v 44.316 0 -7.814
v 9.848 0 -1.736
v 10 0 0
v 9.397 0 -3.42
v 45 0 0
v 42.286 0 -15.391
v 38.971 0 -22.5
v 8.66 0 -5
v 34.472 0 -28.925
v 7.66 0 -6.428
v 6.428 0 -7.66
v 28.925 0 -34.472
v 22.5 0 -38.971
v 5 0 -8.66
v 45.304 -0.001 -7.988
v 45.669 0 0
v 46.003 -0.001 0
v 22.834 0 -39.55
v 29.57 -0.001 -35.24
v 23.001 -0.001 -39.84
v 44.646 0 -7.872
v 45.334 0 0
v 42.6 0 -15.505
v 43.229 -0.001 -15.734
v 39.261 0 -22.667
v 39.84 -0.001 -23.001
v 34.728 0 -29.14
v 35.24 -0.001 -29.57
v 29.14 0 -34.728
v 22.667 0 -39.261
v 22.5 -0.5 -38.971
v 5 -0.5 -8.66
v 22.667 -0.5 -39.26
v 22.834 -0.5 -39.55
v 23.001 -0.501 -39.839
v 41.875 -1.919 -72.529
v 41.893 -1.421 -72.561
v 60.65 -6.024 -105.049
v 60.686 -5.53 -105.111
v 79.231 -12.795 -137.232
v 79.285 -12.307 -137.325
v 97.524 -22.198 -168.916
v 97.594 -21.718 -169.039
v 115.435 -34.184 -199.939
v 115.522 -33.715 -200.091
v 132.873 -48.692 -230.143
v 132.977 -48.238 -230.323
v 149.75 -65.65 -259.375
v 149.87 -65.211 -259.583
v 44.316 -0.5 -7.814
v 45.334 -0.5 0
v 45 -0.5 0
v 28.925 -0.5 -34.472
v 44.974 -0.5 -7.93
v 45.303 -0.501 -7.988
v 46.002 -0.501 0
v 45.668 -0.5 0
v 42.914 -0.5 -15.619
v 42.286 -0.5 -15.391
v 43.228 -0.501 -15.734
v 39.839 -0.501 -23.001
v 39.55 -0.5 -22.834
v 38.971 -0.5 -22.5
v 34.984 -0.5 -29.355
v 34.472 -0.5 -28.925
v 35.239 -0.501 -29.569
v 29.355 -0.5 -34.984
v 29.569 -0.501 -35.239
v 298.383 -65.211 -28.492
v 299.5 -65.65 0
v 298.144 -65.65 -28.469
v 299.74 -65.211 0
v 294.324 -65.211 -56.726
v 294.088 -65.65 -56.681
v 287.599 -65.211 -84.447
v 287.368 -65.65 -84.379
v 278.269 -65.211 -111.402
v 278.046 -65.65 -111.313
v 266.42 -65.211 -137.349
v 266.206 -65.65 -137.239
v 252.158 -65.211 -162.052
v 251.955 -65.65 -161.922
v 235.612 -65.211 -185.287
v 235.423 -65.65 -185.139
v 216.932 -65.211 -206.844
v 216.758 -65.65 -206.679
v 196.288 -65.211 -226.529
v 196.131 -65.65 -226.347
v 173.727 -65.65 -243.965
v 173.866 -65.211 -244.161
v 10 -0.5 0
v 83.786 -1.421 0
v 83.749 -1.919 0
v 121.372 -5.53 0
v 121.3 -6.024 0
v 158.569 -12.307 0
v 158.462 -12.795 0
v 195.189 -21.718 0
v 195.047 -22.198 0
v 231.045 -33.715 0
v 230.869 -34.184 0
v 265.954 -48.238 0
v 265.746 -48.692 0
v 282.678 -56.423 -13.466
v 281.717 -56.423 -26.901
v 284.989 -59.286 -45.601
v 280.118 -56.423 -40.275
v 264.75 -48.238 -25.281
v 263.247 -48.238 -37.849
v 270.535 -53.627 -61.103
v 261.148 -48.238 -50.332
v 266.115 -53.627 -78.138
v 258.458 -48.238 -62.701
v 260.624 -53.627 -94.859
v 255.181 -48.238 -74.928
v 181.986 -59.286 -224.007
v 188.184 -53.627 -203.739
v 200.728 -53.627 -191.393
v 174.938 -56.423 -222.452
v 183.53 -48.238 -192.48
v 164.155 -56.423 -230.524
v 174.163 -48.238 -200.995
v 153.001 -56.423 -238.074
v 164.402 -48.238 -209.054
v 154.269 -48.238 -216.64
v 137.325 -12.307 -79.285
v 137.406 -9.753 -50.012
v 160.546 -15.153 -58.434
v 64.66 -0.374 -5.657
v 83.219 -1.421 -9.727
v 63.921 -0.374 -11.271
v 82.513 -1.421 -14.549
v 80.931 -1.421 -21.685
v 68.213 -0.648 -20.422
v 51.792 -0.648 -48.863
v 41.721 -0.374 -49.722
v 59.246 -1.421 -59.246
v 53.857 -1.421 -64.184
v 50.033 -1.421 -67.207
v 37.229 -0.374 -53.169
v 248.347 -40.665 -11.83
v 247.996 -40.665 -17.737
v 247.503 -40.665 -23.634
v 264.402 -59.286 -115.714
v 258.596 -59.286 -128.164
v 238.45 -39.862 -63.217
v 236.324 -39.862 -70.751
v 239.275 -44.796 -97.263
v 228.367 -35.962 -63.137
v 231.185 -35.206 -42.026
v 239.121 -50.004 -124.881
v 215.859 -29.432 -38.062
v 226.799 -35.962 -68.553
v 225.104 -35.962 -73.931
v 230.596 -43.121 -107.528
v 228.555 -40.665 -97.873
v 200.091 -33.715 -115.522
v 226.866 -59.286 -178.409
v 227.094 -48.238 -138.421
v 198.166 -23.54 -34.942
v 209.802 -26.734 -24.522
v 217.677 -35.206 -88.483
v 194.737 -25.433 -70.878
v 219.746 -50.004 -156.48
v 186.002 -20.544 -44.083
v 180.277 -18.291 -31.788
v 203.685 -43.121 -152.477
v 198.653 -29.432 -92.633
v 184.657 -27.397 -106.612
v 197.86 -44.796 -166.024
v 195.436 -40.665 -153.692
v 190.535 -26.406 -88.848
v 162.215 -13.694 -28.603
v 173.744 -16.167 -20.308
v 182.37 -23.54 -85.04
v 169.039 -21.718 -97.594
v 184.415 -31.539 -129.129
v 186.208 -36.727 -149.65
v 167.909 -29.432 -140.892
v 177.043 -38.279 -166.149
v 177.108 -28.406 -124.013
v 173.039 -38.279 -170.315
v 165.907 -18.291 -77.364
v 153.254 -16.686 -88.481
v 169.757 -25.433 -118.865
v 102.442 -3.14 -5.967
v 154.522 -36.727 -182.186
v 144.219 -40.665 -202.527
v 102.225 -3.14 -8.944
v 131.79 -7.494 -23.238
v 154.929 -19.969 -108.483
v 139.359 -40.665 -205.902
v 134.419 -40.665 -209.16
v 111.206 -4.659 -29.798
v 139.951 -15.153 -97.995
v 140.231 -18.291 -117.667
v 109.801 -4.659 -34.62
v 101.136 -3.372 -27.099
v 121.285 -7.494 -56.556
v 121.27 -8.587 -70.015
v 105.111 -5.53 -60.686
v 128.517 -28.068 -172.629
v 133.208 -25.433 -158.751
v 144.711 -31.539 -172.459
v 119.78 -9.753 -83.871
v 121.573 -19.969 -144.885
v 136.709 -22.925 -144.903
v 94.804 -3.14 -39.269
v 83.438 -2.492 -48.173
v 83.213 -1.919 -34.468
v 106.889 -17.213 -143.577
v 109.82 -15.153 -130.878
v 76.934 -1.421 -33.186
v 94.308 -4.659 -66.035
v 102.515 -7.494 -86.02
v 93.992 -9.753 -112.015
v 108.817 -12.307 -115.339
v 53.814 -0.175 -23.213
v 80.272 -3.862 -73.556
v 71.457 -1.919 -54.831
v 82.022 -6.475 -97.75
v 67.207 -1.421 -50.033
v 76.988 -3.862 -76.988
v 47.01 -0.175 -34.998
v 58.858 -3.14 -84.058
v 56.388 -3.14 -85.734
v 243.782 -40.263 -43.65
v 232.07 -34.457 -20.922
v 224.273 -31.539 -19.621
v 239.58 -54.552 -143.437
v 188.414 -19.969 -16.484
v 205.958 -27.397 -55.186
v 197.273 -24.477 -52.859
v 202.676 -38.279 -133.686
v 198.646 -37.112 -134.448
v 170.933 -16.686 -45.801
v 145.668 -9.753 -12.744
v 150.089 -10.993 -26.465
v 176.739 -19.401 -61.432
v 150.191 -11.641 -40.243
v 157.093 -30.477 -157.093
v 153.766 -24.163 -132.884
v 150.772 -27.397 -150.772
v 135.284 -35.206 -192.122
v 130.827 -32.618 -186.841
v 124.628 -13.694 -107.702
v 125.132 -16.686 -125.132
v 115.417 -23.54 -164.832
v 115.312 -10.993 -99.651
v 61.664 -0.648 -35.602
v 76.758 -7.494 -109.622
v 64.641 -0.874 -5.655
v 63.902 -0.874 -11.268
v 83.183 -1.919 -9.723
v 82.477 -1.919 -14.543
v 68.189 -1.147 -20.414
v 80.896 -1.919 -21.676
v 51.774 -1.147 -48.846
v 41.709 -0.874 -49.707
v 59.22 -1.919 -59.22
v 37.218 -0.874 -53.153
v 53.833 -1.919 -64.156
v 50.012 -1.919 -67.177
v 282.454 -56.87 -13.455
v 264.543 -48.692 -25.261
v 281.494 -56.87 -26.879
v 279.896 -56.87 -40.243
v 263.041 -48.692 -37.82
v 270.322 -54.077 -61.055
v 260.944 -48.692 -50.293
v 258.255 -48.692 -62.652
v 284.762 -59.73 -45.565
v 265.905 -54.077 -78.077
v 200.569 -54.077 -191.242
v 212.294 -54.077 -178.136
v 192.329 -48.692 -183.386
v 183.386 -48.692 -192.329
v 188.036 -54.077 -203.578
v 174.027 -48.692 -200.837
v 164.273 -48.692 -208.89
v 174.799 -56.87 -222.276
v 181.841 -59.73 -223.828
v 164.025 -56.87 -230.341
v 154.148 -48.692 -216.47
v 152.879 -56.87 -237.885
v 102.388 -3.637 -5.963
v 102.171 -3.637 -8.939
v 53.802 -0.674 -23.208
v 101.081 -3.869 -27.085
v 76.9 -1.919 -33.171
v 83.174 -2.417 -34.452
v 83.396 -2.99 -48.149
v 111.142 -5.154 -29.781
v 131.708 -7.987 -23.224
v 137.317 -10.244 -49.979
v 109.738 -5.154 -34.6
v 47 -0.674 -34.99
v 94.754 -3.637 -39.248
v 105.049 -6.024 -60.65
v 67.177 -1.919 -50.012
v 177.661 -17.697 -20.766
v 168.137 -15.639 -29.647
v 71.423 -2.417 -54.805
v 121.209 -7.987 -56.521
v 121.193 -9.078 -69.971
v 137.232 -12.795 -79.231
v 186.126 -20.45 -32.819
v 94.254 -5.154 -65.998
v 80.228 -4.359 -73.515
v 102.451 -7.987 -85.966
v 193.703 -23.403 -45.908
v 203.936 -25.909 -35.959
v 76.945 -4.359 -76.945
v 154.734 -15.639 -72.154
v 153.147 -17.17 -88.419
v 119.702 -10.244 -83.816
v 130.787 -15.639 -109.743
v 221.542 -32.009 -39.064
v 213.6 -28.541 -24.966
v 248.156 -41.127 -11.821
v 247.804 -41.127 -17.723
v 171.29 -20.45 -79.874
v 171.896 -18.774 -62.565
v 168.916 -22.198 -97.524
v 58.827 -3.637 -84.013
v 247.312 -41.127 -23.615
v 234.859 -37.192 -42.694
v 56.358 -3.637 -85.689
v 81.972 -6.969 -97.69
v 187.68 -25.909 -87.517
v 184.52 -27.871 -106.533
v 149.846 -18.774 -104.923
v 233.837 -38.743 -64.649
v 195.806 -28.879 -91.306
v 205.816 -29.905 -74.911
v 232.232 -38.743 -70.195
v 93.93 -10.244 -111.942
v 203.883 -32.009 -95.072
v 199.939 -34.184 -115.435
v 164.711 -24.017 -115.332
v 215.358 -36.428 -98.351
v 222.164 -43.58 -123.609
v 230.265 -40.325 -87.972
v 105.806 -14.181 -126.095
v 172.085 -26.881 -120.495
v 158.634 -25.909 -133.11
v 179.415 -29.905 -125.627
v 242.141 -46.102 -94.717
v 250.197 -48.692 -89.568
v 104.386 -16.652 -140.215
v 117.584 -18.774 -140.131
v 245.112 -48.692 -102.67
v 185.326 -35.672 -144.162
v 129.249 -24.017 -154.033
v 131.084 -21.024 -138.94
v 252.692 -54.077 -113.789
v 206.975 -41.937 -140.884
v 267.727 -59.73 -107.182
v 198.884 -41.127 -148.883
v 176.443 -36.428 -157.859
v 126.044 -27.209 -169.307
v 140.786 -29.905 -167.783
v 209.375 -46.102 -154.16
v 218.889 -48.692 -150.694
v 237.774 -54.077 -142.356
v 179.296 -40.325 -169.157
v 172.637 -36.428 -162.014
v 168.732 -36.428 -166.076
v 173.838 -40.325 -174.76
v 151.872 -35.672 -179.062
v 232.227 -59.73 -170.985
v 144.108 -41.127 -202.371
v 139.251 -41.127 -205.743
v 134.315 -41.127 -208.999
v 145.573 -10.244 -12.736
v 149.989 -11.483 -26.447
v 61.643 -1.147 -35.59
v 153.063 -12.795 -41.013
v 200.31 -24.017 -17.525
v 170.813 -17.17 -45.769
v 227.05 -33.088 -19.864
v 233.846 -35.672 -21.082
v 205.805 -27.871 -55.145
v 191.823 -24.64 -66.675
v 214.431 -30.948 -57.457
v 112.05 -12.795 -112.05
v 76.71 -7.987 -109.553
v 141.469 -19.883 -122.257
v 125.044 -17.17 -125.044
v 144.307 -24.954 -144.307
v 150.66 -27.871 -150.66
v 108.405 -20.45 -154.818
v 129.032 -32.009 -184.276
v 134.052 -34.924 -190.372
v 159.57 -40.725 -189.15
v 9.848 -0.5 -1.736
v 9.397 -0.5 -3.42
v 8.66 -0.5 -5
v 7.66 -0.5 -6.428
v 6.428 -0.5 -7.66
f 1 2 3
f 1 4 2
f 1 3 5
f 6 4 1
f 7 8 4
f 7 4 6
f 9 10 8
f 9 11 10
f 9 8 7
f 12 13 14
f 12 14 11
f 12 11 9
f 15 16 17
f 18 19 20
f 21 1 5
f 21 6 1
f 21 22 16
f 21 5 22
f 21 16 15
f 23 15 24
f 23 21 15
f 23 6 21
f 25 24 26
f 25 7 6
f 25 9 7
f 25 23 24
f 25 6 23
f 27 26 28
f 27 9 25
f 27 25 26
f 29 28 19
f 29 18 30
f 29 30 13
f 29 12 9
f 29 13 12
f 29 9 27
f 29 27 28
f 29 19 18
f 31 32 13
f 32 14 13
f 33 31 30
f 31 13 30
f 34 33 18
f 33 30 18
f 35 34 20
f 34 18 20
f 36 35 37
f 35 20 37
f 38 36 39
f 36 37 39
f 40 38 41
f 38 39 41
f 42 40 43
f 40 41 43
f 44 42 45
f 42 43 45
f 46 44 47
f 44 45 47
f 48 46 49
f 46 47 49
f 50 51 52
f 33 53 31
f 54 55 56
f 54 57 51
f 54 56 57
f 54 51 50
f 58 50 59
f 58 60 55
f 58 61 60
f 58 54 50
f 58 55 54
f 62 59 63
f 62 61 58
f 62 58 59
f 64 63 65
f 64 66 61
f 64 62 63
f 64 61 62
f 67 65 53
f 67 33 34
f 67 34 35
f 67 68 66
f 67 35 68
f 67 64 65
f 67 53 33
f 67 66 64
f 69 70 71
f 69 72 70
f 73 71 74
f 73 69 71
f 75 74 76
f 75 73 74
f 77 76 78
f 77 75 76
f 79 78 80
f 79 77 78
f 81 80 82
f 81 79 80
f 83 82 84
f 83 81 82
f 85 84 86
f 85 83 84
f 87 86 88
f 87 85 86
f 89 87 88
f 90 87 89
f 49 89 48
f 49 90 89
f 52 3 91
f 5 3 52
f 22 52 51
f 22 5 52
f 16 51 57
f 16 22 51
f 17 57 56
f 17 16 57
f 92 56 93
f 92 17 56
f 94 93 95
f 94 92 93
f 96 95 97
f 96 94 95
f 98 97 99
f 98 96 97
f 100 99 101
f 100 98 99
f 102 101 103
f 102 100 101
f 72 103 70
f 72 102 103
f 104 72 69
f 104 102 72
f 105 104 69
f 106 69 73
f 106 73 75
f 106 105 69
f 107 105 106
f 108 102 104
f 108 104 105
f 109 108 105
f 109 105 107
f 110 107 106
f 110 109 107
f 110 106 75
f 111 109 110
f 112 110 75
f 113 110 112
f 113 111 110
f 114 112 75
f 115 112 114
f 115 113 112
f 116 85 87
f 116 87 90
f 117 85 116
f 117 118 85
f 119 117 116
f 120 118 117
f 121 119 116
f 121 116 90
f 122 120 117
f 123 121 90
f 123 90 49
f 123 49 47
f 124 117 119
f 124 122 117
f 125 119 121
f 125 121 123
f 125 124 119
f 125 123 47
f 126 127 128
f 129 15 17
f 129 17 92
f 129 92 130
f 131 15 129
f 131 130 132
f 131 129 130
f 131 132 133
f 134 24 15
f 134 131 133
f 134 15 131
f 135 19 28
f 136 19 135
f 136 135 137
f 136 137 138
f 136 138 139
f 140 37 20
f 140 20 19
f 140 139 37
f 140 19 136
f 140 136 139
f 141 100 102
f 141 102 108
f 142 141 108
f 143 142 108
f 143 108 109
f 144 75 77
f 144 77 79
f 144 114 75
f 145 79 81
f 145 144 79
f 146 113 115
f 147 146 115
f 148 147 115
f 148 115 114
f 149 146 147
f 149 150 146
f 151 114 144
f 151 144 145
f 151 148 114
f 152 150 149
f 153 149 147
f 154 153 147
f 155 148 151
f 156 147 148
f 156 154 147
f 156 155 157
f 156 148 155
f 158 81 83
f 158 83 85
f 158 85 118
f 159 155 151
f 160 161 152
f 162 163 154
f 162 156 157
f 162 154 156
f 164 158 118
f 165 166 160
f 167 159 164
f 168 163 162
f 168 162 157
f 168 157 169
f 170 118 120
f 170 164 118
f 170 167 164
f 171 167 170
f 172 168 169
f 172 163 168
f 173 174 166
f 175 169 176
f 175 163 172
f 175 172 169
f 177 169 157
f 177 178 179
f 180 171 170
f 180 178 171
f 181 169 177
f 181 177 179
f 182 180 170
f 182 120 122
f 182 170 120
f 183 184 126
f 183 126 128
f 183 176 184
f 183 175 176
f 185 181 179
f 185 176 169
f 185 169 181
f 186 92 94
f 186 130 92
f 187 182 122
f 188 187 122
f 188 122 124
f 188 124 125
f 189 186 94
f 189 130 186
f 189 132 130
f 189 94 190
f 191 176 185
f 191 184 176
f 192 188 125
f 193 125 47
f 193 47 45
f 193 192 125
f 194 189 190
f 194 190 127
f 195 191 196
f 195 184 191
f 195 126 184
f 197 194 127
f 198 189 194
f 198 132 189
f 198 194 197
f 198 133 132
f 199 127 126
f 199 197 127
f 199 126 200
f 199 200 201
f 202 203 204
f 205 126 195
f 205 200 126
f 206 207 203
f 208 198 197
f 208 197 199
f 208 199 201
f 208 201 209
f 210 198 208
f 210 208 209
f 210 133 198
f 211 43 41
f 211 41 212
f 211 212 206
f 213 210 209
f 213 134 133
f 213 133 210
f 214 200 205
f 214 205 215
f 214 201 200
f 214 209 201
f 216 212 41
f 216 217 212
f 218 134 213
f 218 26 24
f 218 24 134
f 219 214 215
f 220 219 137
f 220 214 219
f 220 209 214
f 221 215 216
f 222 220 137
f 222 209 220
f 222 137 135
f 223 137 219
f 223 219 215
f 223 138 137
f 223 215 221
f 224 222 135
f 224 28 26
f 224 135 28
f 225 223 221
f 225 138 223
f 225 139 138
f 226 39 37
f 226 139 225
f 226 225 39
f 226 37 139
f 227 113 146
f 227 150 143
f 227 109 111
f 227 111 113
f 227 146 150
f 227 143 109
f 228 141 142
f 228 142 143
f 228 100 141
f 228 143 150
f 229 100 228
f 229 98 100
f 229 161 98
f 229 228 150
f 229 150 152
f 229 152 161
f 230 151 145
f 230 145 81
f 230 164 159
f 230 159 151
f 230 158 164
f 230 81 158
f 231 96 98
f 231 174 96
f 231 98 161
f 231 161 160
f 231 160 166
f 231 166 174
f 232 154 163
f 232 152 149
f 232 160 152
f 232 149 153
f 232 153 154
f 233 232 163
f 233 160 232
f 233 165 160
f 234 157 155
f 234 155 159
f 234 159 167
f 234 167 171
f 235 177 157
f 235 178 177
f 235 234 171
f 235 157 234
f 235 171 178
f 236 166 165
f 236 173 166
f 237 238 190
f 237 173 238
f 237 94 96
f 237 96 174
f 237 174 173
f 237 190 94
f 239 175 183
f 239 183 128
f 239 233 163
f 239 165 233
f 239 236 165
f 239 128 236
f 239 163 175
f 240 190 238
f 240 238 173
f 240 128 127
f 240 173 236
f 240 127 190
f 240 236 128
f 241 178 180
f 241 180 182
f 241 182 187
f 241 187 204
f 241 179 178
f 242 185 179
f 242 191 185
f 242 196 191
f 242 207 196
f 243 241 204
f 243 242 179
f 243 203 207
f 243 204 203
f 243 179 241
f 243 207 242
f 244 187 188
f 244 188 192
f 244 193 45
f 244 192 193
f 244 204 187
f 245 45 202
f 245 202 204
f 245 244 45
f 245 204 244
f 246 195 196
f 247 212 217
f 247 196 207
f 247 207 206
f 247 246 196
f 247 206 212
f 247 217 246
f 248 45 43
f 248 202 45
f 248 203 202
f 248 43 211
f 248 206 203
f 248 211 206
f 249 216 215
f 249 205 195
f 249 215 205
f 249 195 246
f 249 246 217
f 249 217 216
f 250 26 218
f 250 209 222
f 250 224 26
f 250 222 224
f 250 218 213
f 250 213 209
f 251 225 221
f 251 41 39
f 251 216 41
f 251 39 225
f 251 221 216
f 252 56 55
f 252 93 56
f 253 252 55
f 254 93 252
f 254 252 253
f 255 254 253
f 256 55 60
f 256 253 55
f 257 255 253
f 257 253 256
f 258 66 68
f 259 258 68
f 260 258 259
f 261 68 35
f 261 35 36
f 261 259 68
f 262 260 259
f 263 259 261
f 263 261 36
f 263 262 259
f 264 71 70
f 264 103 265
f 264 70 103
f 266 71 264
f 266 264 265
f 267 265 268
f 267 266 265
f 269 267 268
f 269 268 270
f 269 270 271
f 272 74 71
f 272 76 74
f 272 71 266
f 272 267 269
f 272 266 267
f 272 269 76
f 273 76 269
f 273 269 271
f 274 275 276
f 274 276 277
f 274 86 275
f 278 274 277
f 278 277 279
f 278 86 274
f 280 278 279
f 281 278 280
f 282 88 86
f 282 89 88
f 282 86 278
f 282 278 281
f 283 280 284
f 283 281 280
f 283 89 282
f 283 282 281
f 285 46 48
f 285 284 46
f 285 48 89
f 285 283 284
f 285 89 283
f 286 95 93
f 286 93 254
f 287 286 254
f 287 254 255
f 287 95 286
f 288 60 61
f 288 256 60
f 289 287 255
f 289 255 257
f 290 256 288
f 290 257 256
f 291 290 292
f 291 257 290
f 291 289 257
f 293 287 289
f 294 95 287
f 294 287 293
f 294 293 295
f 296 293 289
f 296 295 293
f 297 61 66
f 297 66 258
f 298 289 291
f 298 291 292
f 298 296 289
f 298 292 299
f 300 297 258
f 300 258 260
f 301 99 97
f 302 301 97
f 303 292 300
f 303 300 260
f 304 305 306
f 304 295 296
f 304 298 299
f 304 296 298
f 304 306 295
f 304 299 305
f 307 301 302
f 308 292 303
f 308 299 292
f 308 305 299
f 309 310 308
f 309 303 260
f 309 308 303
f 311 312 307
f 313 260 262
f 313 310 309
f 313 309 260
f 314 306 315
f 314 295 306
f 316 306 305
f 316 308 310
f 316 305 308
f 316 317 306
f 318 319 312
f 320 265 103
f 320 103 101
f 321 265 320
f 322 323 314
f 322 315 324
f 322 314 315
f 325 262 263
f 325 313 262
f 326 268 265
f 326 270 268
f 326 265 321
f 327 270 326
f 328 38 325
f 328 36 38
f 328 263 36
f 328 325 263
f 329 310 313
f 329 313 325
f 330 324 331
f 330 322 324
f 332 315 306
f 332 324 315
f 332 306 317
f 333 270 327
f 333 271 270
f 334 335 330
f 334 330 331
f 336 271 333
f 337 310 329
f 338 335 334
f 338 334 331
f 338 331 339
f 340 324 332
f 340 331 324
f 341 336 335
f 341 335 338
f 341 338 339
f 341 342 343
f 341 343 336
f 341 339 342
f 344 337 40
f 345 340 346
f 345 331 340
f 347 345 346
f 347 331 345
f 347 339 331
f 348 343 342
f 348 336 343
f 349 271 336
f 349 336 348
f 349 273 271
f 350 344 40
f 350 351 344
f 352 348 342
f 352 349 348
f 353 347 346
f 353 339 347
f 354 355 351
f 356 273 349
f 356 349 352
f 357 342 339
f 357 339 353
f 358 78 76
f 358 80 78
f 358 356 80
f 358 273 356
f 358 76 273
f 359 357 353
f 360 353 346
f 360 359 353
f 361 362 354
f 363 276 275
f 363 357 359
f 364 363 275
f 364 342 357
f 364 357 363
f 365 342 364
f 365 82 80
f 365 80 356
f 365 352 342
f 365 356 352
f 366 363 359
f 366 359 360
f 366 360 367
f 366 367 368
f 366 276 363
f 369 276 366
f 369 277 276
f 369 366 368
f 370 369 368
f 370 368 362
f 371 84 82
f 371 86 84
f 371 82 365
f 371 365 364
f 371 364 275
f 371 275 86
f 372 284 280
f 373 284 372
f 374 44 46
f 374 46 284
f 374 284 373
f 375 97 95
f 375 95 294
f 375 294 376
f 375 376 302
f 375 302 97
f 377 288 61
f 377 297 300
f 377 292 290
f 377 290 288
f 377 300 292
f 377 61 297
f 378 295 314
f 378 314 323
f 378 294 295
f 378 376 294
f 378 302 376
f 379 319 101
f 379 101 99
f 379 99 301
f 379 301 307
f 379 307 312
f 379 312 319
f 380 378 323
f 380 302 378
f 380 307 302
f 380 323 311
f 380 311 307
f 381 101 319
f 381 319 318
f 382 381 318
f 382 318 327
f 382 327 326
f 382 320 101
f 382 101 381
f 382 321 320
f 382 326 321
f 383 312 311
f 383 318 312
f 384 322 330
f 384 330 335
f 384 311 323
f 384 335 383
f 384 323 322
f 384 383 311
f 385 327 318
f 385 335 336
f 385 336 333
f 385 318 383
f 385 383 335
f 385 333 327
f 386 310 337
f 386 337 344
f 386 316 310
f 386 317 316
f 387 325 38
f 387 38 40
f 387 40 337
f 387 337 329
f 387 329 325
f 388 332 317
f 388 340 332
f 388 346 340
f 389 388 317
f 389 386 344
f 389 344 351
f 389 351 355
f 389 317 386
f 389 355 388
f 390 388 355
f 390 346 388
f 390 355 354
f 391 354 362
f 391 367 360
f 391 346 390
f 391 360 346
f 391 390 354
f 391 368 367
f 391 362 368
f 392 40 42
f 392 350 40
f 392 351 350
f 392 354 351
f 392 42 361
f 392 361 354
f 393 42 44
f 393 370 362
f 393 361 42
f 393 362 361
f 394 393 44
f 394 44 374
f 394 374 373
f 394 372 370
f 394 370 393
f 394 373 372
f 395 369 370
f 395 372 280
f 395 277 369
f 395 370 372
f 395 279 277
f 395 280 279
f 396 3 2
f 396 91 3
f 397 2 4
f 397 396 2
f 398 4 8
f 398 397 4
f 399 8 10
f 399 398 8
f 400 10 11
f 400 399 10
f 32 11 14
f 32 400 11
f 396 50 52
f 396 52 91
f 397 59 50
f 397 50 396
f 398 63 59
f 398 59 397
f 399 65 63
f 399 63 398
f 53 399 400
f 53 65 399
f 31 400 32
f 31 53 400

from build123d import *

# Parameters (mm, degrees)
REVOLVE1_ANGLE = 60


with BuildPart() as part:
    # Sketch1 → Revolve1 (revolve)
    with BuildSketch(Plane.XY):
        with BuildLine():
            Line((10, -0.5), (45, -0.5))
            ThreePointArc((45, -0.5), (45.500946005, -0.500236893), (46.001891561, -0.50094757))
            ThreePointArc((46.001891561, -0.50094757), (176.838494864, -17.170276226), (299.5, -65.649534053))
            Line((299.5, -65.649534053), (299.740246695, -65.211034879))
            ThreePointArc((299.740246695, -65.211034879), (176.962949727, -16.686012882), (46.002837341, -0.000948465))
            ThreePointArc((46.002837341, -0.000948465), (45.501418895, -0.000237116), (45, 0))
            Line((45, 0), (10, 0))
            Line((10, 0), (10, -0.5))
        make_face()
    revolve(axis=Axis((0, -1000, 0), (0, 1, 0)), revolution_arc=REVOLVE1_ANGLE)


solid = part.part
